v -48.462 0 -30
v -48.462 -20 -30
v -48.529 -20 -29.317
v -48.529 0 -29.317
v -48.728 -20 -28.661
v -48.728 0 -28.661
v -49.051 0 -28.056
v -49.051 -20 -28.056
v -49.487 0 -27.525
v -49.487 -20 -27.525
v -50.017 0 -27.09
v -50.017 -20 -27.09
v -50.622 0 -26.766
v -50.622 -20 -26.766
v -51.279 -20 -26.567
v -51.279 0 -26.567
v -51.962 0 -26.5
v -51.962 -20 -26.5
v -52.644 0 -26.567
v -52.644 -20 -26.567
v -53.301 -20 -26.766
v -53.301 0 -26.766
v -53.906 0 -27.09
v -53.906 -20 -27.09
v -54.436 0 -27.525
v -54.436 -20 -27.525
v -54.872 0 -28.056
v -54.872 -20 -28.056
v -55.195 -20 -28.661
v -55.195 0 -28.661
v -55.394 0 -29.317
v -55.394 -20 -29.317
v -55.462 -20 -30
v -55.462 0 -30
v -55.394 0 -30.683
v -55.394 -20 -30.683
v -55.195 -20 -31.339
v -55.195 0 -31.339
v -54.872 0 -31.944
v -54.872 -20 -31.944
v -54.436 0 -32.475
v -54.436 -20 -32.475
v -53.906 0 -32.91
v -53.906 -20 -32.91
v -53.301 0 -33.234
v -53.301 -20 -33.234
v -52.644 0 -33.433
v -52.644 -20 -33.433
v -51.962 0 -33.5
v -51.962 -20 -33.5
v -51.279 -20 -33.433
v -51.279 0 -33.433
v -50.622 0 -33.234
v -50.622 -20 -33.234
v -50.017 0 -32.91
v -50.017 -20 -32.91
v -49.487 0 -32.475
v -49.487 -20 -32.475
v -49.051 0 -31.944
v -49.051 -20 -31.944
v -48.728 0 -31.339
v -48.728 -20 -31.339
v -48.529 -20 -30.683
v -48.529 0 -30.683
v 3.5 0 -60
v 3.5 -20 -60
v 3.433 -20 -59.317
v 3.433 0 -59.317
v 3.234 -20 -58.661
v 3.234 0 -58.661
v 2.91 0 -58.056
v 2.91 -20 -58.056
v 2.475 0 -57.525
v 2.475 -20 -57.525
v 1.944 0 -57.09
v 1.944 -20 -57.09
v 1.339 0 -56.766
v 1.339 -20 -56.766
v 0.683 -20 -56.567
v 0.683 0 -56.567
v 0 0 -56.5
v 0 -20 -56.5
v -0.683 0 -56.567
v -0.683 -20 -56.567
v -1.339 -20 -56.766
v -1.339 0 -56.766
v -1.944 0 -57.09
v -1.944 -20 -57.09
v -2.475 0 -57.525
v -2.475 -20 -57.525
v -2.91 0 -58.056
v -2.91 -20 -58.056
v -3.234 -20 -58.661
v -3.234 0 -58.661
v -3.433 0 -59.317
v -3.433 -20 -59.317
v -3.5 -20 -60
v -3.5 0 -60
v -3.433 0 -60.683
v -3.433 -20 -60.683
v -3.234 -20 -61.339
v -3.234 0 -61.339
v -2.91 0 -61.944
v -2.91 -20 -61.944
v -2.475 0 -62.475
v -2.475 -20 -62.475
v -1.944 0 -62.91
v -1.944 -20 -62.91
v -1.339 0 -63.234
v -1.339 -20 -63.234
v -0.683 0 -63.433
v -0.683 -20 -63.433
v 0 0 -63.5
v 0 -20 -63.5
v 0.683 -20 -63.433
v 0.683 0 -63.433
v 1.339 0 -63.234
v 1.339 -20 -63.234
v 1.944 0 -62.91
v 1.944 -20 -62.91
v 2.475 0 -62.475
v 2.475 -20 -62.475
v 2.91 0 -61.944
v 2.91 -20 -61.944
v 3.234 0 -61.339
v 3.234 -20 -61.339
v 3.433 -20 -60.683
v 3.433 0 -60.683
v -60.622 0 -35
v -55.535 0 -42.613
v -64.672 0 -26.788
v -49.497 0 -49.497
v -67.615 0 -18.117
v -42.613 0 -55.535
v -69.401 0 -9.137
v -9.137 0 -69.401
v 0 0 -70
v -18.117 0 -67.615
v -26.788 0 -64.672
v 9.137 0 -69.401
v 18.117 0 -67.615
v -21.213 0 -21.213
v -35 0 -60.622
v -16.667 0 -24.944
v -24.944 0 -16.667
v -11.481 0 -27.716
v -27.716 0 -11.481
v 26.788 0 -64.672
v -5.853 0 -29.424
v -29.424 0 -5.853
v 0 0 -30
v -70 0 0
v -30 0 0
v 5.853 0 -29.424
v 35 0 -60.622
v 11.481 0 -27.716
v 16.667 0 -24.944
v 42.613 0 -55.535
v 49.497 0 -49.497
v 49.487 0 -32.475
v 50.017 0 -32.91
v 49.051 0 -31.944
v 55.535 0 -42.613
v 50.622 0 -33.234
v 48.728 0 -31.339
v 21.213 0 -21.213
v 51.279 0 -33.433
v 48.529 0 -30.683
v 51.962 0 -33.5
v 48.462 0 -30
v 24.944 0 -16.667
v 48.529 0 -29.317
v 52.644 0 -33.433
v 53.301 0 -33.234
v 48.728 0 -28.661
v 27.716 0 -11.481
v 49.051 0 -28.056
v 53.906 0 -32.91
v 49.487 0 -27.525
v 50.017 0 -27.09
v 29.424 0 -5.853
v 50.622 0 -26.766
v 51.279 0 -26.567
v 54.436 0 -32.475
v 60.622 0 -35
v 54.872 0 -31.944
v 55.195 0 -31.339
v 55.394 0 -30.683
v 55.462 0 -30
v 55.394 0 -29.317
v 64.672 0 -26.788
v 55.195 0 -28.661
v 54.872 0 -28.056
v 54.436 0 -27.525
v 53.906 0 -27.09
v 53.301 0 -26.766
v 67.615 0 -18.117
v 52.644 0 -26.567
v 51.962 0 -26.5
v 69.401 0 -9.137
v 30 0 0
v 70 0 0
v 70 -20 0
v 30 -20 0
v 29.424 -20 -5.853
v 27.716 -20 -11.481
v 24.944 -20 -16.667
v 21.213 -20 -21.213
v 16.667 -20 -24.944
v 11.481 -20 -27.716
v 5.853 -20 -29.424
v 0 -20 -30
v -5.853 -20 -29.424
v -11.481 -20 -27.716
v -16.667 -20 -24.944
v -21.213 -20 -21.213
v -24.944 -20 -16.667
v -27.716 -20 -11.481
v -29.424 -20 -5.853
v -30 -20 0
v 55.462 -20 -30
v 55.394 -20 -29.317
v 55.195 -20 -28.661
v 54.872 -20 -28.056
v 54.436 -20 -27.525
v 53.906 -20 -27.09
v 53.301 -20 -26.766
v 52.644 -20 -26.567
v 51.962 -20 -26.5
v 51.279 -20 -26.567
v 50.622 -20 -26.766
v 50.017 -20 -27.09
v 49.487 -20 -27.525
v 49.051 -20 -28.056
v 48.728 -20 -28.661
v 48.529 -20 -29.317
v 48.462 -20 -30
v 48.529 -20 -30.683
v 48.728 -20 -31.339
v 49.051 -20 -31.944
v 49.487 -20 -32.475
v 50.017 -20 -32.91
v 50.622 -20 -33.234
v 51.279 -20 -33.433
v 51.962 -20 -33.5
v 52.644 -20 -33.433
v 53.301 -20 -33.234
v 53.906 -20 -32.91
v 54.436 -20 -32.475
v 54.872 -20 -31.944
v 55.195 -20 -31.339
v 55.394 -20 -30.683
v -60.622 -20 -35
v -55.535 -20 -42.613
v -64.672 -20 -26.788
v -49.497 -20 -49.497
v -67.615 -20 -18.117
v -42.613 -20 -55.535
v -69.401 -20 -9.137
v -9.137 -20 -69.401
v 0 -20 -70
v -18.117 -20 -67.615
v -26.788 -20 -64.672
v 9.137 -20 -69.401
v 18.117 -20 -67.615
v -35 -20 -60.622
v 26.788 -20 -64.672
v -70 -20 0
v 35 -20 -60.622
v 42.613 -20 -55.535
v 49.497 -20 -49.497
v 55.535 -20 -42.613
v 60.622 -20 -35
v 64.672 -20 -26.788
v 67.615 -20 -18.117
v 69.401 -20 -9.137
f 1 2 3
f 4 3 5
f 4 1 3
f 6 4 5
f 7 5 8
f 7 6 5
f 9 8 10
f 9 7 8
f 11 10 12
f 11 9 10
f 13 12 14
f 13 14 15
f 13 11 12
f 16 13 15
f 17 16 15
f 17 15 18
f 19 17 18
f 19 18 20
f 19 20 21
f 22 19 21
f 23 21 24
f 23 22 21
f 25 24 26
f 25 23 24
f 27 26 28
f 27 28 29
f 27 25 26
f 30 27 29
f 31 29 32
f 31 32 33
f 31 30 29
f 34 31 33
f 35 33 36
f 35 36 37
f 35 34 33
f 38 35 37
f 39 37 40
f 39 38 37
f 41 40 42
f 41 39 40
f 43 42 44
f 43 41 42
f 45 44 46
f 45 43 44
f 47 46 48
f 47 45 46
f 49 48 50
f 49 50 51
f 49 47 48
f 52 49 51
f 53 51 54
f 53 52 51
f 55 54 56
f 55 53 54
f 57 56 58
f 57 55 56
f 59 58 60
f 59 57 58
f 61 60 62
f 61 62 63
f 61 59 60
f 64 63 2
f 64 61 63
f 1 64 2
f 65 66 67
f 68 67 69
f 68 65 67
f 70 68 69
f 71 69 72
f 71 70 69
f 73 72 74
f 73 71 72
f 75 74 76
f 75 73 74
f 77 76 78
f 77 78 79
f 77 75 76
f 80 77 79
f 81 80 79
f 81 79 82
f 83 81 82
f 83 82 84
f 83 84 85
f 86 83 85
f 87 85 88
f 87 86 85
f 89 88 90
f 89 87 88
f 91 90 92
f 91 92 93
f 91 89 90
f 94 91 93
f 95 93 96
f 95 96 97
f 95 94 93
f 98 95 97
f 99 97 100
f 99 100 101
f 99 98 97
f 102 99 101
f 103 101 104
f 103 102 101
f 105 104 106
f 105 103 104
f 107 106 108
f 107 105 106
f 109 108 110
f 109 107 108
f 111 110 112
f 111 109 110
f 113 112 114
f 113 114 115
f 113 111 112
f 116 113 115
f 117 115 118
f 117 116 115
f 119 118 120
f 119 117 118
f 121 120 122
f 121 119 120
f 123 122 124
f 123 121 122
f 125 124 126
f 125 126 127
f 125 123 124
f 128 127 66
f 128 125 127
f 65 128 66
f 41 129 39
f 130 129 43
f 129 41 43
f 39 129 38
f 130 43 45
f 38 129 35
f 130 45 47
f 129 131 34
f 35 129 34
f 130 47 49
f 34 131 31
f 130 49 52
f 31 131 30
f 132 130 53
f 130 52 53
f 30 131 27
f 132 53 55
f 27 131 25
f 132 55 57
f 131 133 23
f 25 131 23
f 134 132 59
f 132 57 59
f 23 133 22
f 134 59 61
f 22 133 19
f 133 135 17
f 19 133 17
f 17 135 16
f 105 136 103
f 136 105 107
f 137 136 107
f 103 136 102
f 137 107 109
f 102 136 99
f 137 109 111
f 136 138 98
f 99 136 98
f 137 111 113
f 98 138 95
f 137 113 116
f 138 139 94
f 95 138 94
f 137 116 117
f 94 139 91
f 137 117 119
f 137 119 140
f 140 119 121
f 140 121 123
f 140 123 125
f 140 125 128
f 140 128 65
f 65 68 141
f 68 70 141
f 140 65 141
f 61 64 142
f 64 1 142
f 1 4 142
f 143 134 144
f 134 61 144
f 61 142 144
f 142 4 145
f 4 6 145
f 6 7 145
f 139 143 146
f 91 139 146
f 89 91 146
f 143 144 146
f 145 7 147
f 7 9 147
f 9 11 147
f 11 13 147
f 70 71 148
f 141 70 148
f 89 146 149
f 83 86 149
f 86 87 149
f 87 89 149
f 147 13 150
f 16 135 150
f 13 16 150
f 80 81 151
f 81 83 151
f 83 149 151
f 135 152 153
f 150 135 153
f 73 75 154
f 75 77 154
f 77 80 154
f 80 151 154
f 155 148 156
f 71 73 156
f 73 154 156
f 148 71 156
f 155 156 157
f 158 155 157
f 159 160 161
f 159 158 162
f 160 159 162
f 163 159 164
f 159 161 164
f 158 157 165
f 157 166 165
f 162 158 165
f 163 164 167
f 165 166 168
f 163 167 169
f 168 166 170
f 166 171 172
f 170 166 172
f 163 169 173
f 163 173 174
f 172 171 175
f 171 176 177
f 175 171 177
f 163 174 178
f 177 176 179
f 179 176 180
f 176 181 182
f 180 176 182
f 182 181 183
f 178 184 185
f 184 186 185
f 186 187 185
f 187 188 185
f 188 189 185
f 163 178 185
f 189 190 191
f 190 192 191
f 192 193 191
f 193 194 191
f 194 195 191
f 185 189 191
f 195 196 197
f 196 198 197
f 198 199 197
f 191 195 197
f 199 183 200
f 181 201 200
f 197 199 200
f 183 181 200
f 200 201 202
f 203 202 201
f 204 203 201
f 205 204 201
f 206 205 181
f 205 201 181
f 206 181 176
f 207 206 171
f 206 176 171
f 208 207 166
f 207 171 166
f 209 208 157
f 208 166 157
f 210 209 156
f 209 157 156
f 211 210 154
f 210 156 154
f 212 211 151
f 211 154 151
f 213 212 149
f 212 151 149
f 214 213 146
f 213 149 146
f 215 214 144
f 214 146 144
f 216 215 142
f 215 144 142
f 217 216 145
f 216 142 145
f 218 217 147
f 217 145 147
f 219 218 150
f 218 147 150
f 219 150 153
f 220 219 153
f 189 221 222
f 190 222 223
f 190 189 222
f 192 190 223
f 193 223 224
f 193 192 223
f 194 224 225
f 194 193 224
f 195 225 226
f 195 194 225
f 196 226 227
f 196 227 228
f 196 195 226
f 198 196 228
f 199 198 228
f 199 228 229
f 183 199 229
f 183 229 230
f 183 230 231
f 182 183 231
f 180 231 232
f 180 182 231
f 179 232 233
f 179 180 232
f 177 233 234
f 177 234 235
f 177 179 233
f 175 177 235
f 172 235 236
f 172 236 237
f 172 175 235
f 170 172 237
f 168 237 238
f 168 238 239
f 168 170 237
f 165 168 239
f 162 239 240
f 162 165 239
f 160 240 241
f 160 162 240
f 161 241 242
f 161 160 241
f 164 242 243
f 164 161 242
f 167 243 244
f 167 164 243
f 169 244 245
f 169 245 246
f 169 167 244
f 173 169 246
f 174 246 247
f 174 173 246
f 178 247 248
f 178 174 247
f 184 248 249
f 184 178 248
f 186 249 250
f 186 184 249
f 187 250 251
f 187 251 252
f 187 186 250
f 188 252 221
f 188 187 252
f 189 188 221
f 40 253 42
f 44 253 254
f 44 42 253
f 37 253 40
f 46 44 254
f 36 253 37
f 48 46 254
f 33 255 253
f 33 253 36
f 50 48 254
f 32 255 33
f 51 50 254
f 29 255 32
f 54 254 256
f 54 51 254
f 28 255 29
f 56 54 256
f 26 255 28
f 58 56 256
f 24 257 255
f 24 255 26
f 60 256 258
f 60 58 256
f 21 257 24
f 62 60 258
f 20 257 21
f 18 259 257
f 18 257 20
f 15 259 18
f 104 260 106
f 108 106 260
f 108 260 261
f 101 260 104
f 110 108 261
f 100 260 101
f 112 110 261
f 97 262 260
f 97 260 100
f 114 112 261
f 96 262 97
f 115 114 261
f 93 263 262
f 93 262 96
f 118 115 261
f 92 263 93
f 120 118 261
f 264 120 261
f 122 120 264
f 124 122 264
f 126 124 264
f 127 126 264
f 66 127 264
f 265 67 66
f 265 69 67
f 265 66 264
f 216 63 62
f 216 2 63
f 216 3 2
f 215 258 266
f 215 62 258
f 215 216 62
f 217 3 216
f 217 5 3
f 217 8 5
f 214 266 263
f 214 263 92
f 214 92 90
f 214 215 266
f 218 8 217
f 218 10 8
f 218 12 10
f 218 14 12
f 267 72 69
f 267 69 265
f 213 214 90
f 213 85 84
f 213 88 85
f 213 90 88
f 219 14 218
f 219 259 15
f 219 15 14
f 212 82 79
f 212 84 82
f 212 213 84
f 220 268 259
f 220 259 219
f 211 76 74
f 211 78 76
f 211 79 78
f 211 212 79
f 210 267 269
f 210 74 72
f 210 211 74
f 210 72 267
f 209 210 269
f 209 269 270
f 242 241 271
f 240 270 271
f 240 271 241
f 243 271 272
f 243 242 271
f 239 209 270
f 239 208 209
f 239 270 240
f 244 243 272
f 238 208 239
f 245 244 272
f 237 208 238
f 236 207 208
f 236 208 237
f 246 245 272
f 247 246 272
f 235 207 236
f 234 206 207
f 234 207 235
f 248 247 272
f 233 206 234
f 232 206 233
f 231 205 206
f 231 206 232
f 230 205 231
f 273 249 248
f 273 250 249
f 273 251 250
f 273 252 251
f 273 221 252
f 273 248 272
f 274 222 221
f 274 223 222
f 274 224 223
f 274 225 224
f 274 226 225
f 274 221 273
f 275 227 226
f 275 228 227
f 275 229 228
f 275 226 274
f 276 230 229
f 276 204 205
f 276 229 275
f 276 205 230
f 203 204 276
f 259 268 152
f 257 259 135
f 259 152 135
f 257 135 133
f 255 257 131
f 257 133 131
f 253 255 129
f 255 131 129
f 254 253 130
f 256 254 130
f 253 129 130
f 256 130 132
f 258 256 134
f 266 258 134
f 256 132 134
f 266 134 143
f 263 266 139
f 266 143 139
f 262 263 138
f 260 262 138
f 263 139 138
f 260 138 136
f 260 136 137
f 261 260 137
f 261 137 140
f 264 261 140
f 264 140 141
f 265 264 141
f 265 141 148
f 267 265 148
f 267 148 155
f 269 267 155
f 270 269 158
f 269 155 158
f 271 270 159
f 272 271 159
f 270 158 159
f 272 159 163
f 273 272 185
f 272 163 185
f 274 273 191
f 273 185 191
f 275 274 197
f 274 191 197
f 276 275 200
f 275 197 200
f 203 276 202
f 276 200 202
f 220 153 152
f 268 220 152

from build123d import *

# Parameters (mm, degrees)
F0_R     = 3.5
F1_DEPTH = 20


with BuildPart() as f1:
    # F0 (on Front) → F1 (new body)
    with BuildSketch(Plane.XZ):
        with BuildLine():
            ThreePointArc((-70, 0), (0, -70), (70, 0))
            Line((70, 0), (30, 0))
            ThreePointArc((30, 0), (0, -30), (-30, 0))
            Line((-30, 0), (-70, 0))
        make_face()
        with Locations((0, -60)):
            Circle(F0_R, mode=Mode.SUBTRACT)
        with Locations((-51.961524, -30)):
            Circle(F0_R, mode=Mode.SUBTRACT)
        with Locations((51.961524, -30)):
            Circle(F0_R, mode=Mode.SUBTRACT)
    extrude(amount=F1_DEPTH)


solid = f1.part
